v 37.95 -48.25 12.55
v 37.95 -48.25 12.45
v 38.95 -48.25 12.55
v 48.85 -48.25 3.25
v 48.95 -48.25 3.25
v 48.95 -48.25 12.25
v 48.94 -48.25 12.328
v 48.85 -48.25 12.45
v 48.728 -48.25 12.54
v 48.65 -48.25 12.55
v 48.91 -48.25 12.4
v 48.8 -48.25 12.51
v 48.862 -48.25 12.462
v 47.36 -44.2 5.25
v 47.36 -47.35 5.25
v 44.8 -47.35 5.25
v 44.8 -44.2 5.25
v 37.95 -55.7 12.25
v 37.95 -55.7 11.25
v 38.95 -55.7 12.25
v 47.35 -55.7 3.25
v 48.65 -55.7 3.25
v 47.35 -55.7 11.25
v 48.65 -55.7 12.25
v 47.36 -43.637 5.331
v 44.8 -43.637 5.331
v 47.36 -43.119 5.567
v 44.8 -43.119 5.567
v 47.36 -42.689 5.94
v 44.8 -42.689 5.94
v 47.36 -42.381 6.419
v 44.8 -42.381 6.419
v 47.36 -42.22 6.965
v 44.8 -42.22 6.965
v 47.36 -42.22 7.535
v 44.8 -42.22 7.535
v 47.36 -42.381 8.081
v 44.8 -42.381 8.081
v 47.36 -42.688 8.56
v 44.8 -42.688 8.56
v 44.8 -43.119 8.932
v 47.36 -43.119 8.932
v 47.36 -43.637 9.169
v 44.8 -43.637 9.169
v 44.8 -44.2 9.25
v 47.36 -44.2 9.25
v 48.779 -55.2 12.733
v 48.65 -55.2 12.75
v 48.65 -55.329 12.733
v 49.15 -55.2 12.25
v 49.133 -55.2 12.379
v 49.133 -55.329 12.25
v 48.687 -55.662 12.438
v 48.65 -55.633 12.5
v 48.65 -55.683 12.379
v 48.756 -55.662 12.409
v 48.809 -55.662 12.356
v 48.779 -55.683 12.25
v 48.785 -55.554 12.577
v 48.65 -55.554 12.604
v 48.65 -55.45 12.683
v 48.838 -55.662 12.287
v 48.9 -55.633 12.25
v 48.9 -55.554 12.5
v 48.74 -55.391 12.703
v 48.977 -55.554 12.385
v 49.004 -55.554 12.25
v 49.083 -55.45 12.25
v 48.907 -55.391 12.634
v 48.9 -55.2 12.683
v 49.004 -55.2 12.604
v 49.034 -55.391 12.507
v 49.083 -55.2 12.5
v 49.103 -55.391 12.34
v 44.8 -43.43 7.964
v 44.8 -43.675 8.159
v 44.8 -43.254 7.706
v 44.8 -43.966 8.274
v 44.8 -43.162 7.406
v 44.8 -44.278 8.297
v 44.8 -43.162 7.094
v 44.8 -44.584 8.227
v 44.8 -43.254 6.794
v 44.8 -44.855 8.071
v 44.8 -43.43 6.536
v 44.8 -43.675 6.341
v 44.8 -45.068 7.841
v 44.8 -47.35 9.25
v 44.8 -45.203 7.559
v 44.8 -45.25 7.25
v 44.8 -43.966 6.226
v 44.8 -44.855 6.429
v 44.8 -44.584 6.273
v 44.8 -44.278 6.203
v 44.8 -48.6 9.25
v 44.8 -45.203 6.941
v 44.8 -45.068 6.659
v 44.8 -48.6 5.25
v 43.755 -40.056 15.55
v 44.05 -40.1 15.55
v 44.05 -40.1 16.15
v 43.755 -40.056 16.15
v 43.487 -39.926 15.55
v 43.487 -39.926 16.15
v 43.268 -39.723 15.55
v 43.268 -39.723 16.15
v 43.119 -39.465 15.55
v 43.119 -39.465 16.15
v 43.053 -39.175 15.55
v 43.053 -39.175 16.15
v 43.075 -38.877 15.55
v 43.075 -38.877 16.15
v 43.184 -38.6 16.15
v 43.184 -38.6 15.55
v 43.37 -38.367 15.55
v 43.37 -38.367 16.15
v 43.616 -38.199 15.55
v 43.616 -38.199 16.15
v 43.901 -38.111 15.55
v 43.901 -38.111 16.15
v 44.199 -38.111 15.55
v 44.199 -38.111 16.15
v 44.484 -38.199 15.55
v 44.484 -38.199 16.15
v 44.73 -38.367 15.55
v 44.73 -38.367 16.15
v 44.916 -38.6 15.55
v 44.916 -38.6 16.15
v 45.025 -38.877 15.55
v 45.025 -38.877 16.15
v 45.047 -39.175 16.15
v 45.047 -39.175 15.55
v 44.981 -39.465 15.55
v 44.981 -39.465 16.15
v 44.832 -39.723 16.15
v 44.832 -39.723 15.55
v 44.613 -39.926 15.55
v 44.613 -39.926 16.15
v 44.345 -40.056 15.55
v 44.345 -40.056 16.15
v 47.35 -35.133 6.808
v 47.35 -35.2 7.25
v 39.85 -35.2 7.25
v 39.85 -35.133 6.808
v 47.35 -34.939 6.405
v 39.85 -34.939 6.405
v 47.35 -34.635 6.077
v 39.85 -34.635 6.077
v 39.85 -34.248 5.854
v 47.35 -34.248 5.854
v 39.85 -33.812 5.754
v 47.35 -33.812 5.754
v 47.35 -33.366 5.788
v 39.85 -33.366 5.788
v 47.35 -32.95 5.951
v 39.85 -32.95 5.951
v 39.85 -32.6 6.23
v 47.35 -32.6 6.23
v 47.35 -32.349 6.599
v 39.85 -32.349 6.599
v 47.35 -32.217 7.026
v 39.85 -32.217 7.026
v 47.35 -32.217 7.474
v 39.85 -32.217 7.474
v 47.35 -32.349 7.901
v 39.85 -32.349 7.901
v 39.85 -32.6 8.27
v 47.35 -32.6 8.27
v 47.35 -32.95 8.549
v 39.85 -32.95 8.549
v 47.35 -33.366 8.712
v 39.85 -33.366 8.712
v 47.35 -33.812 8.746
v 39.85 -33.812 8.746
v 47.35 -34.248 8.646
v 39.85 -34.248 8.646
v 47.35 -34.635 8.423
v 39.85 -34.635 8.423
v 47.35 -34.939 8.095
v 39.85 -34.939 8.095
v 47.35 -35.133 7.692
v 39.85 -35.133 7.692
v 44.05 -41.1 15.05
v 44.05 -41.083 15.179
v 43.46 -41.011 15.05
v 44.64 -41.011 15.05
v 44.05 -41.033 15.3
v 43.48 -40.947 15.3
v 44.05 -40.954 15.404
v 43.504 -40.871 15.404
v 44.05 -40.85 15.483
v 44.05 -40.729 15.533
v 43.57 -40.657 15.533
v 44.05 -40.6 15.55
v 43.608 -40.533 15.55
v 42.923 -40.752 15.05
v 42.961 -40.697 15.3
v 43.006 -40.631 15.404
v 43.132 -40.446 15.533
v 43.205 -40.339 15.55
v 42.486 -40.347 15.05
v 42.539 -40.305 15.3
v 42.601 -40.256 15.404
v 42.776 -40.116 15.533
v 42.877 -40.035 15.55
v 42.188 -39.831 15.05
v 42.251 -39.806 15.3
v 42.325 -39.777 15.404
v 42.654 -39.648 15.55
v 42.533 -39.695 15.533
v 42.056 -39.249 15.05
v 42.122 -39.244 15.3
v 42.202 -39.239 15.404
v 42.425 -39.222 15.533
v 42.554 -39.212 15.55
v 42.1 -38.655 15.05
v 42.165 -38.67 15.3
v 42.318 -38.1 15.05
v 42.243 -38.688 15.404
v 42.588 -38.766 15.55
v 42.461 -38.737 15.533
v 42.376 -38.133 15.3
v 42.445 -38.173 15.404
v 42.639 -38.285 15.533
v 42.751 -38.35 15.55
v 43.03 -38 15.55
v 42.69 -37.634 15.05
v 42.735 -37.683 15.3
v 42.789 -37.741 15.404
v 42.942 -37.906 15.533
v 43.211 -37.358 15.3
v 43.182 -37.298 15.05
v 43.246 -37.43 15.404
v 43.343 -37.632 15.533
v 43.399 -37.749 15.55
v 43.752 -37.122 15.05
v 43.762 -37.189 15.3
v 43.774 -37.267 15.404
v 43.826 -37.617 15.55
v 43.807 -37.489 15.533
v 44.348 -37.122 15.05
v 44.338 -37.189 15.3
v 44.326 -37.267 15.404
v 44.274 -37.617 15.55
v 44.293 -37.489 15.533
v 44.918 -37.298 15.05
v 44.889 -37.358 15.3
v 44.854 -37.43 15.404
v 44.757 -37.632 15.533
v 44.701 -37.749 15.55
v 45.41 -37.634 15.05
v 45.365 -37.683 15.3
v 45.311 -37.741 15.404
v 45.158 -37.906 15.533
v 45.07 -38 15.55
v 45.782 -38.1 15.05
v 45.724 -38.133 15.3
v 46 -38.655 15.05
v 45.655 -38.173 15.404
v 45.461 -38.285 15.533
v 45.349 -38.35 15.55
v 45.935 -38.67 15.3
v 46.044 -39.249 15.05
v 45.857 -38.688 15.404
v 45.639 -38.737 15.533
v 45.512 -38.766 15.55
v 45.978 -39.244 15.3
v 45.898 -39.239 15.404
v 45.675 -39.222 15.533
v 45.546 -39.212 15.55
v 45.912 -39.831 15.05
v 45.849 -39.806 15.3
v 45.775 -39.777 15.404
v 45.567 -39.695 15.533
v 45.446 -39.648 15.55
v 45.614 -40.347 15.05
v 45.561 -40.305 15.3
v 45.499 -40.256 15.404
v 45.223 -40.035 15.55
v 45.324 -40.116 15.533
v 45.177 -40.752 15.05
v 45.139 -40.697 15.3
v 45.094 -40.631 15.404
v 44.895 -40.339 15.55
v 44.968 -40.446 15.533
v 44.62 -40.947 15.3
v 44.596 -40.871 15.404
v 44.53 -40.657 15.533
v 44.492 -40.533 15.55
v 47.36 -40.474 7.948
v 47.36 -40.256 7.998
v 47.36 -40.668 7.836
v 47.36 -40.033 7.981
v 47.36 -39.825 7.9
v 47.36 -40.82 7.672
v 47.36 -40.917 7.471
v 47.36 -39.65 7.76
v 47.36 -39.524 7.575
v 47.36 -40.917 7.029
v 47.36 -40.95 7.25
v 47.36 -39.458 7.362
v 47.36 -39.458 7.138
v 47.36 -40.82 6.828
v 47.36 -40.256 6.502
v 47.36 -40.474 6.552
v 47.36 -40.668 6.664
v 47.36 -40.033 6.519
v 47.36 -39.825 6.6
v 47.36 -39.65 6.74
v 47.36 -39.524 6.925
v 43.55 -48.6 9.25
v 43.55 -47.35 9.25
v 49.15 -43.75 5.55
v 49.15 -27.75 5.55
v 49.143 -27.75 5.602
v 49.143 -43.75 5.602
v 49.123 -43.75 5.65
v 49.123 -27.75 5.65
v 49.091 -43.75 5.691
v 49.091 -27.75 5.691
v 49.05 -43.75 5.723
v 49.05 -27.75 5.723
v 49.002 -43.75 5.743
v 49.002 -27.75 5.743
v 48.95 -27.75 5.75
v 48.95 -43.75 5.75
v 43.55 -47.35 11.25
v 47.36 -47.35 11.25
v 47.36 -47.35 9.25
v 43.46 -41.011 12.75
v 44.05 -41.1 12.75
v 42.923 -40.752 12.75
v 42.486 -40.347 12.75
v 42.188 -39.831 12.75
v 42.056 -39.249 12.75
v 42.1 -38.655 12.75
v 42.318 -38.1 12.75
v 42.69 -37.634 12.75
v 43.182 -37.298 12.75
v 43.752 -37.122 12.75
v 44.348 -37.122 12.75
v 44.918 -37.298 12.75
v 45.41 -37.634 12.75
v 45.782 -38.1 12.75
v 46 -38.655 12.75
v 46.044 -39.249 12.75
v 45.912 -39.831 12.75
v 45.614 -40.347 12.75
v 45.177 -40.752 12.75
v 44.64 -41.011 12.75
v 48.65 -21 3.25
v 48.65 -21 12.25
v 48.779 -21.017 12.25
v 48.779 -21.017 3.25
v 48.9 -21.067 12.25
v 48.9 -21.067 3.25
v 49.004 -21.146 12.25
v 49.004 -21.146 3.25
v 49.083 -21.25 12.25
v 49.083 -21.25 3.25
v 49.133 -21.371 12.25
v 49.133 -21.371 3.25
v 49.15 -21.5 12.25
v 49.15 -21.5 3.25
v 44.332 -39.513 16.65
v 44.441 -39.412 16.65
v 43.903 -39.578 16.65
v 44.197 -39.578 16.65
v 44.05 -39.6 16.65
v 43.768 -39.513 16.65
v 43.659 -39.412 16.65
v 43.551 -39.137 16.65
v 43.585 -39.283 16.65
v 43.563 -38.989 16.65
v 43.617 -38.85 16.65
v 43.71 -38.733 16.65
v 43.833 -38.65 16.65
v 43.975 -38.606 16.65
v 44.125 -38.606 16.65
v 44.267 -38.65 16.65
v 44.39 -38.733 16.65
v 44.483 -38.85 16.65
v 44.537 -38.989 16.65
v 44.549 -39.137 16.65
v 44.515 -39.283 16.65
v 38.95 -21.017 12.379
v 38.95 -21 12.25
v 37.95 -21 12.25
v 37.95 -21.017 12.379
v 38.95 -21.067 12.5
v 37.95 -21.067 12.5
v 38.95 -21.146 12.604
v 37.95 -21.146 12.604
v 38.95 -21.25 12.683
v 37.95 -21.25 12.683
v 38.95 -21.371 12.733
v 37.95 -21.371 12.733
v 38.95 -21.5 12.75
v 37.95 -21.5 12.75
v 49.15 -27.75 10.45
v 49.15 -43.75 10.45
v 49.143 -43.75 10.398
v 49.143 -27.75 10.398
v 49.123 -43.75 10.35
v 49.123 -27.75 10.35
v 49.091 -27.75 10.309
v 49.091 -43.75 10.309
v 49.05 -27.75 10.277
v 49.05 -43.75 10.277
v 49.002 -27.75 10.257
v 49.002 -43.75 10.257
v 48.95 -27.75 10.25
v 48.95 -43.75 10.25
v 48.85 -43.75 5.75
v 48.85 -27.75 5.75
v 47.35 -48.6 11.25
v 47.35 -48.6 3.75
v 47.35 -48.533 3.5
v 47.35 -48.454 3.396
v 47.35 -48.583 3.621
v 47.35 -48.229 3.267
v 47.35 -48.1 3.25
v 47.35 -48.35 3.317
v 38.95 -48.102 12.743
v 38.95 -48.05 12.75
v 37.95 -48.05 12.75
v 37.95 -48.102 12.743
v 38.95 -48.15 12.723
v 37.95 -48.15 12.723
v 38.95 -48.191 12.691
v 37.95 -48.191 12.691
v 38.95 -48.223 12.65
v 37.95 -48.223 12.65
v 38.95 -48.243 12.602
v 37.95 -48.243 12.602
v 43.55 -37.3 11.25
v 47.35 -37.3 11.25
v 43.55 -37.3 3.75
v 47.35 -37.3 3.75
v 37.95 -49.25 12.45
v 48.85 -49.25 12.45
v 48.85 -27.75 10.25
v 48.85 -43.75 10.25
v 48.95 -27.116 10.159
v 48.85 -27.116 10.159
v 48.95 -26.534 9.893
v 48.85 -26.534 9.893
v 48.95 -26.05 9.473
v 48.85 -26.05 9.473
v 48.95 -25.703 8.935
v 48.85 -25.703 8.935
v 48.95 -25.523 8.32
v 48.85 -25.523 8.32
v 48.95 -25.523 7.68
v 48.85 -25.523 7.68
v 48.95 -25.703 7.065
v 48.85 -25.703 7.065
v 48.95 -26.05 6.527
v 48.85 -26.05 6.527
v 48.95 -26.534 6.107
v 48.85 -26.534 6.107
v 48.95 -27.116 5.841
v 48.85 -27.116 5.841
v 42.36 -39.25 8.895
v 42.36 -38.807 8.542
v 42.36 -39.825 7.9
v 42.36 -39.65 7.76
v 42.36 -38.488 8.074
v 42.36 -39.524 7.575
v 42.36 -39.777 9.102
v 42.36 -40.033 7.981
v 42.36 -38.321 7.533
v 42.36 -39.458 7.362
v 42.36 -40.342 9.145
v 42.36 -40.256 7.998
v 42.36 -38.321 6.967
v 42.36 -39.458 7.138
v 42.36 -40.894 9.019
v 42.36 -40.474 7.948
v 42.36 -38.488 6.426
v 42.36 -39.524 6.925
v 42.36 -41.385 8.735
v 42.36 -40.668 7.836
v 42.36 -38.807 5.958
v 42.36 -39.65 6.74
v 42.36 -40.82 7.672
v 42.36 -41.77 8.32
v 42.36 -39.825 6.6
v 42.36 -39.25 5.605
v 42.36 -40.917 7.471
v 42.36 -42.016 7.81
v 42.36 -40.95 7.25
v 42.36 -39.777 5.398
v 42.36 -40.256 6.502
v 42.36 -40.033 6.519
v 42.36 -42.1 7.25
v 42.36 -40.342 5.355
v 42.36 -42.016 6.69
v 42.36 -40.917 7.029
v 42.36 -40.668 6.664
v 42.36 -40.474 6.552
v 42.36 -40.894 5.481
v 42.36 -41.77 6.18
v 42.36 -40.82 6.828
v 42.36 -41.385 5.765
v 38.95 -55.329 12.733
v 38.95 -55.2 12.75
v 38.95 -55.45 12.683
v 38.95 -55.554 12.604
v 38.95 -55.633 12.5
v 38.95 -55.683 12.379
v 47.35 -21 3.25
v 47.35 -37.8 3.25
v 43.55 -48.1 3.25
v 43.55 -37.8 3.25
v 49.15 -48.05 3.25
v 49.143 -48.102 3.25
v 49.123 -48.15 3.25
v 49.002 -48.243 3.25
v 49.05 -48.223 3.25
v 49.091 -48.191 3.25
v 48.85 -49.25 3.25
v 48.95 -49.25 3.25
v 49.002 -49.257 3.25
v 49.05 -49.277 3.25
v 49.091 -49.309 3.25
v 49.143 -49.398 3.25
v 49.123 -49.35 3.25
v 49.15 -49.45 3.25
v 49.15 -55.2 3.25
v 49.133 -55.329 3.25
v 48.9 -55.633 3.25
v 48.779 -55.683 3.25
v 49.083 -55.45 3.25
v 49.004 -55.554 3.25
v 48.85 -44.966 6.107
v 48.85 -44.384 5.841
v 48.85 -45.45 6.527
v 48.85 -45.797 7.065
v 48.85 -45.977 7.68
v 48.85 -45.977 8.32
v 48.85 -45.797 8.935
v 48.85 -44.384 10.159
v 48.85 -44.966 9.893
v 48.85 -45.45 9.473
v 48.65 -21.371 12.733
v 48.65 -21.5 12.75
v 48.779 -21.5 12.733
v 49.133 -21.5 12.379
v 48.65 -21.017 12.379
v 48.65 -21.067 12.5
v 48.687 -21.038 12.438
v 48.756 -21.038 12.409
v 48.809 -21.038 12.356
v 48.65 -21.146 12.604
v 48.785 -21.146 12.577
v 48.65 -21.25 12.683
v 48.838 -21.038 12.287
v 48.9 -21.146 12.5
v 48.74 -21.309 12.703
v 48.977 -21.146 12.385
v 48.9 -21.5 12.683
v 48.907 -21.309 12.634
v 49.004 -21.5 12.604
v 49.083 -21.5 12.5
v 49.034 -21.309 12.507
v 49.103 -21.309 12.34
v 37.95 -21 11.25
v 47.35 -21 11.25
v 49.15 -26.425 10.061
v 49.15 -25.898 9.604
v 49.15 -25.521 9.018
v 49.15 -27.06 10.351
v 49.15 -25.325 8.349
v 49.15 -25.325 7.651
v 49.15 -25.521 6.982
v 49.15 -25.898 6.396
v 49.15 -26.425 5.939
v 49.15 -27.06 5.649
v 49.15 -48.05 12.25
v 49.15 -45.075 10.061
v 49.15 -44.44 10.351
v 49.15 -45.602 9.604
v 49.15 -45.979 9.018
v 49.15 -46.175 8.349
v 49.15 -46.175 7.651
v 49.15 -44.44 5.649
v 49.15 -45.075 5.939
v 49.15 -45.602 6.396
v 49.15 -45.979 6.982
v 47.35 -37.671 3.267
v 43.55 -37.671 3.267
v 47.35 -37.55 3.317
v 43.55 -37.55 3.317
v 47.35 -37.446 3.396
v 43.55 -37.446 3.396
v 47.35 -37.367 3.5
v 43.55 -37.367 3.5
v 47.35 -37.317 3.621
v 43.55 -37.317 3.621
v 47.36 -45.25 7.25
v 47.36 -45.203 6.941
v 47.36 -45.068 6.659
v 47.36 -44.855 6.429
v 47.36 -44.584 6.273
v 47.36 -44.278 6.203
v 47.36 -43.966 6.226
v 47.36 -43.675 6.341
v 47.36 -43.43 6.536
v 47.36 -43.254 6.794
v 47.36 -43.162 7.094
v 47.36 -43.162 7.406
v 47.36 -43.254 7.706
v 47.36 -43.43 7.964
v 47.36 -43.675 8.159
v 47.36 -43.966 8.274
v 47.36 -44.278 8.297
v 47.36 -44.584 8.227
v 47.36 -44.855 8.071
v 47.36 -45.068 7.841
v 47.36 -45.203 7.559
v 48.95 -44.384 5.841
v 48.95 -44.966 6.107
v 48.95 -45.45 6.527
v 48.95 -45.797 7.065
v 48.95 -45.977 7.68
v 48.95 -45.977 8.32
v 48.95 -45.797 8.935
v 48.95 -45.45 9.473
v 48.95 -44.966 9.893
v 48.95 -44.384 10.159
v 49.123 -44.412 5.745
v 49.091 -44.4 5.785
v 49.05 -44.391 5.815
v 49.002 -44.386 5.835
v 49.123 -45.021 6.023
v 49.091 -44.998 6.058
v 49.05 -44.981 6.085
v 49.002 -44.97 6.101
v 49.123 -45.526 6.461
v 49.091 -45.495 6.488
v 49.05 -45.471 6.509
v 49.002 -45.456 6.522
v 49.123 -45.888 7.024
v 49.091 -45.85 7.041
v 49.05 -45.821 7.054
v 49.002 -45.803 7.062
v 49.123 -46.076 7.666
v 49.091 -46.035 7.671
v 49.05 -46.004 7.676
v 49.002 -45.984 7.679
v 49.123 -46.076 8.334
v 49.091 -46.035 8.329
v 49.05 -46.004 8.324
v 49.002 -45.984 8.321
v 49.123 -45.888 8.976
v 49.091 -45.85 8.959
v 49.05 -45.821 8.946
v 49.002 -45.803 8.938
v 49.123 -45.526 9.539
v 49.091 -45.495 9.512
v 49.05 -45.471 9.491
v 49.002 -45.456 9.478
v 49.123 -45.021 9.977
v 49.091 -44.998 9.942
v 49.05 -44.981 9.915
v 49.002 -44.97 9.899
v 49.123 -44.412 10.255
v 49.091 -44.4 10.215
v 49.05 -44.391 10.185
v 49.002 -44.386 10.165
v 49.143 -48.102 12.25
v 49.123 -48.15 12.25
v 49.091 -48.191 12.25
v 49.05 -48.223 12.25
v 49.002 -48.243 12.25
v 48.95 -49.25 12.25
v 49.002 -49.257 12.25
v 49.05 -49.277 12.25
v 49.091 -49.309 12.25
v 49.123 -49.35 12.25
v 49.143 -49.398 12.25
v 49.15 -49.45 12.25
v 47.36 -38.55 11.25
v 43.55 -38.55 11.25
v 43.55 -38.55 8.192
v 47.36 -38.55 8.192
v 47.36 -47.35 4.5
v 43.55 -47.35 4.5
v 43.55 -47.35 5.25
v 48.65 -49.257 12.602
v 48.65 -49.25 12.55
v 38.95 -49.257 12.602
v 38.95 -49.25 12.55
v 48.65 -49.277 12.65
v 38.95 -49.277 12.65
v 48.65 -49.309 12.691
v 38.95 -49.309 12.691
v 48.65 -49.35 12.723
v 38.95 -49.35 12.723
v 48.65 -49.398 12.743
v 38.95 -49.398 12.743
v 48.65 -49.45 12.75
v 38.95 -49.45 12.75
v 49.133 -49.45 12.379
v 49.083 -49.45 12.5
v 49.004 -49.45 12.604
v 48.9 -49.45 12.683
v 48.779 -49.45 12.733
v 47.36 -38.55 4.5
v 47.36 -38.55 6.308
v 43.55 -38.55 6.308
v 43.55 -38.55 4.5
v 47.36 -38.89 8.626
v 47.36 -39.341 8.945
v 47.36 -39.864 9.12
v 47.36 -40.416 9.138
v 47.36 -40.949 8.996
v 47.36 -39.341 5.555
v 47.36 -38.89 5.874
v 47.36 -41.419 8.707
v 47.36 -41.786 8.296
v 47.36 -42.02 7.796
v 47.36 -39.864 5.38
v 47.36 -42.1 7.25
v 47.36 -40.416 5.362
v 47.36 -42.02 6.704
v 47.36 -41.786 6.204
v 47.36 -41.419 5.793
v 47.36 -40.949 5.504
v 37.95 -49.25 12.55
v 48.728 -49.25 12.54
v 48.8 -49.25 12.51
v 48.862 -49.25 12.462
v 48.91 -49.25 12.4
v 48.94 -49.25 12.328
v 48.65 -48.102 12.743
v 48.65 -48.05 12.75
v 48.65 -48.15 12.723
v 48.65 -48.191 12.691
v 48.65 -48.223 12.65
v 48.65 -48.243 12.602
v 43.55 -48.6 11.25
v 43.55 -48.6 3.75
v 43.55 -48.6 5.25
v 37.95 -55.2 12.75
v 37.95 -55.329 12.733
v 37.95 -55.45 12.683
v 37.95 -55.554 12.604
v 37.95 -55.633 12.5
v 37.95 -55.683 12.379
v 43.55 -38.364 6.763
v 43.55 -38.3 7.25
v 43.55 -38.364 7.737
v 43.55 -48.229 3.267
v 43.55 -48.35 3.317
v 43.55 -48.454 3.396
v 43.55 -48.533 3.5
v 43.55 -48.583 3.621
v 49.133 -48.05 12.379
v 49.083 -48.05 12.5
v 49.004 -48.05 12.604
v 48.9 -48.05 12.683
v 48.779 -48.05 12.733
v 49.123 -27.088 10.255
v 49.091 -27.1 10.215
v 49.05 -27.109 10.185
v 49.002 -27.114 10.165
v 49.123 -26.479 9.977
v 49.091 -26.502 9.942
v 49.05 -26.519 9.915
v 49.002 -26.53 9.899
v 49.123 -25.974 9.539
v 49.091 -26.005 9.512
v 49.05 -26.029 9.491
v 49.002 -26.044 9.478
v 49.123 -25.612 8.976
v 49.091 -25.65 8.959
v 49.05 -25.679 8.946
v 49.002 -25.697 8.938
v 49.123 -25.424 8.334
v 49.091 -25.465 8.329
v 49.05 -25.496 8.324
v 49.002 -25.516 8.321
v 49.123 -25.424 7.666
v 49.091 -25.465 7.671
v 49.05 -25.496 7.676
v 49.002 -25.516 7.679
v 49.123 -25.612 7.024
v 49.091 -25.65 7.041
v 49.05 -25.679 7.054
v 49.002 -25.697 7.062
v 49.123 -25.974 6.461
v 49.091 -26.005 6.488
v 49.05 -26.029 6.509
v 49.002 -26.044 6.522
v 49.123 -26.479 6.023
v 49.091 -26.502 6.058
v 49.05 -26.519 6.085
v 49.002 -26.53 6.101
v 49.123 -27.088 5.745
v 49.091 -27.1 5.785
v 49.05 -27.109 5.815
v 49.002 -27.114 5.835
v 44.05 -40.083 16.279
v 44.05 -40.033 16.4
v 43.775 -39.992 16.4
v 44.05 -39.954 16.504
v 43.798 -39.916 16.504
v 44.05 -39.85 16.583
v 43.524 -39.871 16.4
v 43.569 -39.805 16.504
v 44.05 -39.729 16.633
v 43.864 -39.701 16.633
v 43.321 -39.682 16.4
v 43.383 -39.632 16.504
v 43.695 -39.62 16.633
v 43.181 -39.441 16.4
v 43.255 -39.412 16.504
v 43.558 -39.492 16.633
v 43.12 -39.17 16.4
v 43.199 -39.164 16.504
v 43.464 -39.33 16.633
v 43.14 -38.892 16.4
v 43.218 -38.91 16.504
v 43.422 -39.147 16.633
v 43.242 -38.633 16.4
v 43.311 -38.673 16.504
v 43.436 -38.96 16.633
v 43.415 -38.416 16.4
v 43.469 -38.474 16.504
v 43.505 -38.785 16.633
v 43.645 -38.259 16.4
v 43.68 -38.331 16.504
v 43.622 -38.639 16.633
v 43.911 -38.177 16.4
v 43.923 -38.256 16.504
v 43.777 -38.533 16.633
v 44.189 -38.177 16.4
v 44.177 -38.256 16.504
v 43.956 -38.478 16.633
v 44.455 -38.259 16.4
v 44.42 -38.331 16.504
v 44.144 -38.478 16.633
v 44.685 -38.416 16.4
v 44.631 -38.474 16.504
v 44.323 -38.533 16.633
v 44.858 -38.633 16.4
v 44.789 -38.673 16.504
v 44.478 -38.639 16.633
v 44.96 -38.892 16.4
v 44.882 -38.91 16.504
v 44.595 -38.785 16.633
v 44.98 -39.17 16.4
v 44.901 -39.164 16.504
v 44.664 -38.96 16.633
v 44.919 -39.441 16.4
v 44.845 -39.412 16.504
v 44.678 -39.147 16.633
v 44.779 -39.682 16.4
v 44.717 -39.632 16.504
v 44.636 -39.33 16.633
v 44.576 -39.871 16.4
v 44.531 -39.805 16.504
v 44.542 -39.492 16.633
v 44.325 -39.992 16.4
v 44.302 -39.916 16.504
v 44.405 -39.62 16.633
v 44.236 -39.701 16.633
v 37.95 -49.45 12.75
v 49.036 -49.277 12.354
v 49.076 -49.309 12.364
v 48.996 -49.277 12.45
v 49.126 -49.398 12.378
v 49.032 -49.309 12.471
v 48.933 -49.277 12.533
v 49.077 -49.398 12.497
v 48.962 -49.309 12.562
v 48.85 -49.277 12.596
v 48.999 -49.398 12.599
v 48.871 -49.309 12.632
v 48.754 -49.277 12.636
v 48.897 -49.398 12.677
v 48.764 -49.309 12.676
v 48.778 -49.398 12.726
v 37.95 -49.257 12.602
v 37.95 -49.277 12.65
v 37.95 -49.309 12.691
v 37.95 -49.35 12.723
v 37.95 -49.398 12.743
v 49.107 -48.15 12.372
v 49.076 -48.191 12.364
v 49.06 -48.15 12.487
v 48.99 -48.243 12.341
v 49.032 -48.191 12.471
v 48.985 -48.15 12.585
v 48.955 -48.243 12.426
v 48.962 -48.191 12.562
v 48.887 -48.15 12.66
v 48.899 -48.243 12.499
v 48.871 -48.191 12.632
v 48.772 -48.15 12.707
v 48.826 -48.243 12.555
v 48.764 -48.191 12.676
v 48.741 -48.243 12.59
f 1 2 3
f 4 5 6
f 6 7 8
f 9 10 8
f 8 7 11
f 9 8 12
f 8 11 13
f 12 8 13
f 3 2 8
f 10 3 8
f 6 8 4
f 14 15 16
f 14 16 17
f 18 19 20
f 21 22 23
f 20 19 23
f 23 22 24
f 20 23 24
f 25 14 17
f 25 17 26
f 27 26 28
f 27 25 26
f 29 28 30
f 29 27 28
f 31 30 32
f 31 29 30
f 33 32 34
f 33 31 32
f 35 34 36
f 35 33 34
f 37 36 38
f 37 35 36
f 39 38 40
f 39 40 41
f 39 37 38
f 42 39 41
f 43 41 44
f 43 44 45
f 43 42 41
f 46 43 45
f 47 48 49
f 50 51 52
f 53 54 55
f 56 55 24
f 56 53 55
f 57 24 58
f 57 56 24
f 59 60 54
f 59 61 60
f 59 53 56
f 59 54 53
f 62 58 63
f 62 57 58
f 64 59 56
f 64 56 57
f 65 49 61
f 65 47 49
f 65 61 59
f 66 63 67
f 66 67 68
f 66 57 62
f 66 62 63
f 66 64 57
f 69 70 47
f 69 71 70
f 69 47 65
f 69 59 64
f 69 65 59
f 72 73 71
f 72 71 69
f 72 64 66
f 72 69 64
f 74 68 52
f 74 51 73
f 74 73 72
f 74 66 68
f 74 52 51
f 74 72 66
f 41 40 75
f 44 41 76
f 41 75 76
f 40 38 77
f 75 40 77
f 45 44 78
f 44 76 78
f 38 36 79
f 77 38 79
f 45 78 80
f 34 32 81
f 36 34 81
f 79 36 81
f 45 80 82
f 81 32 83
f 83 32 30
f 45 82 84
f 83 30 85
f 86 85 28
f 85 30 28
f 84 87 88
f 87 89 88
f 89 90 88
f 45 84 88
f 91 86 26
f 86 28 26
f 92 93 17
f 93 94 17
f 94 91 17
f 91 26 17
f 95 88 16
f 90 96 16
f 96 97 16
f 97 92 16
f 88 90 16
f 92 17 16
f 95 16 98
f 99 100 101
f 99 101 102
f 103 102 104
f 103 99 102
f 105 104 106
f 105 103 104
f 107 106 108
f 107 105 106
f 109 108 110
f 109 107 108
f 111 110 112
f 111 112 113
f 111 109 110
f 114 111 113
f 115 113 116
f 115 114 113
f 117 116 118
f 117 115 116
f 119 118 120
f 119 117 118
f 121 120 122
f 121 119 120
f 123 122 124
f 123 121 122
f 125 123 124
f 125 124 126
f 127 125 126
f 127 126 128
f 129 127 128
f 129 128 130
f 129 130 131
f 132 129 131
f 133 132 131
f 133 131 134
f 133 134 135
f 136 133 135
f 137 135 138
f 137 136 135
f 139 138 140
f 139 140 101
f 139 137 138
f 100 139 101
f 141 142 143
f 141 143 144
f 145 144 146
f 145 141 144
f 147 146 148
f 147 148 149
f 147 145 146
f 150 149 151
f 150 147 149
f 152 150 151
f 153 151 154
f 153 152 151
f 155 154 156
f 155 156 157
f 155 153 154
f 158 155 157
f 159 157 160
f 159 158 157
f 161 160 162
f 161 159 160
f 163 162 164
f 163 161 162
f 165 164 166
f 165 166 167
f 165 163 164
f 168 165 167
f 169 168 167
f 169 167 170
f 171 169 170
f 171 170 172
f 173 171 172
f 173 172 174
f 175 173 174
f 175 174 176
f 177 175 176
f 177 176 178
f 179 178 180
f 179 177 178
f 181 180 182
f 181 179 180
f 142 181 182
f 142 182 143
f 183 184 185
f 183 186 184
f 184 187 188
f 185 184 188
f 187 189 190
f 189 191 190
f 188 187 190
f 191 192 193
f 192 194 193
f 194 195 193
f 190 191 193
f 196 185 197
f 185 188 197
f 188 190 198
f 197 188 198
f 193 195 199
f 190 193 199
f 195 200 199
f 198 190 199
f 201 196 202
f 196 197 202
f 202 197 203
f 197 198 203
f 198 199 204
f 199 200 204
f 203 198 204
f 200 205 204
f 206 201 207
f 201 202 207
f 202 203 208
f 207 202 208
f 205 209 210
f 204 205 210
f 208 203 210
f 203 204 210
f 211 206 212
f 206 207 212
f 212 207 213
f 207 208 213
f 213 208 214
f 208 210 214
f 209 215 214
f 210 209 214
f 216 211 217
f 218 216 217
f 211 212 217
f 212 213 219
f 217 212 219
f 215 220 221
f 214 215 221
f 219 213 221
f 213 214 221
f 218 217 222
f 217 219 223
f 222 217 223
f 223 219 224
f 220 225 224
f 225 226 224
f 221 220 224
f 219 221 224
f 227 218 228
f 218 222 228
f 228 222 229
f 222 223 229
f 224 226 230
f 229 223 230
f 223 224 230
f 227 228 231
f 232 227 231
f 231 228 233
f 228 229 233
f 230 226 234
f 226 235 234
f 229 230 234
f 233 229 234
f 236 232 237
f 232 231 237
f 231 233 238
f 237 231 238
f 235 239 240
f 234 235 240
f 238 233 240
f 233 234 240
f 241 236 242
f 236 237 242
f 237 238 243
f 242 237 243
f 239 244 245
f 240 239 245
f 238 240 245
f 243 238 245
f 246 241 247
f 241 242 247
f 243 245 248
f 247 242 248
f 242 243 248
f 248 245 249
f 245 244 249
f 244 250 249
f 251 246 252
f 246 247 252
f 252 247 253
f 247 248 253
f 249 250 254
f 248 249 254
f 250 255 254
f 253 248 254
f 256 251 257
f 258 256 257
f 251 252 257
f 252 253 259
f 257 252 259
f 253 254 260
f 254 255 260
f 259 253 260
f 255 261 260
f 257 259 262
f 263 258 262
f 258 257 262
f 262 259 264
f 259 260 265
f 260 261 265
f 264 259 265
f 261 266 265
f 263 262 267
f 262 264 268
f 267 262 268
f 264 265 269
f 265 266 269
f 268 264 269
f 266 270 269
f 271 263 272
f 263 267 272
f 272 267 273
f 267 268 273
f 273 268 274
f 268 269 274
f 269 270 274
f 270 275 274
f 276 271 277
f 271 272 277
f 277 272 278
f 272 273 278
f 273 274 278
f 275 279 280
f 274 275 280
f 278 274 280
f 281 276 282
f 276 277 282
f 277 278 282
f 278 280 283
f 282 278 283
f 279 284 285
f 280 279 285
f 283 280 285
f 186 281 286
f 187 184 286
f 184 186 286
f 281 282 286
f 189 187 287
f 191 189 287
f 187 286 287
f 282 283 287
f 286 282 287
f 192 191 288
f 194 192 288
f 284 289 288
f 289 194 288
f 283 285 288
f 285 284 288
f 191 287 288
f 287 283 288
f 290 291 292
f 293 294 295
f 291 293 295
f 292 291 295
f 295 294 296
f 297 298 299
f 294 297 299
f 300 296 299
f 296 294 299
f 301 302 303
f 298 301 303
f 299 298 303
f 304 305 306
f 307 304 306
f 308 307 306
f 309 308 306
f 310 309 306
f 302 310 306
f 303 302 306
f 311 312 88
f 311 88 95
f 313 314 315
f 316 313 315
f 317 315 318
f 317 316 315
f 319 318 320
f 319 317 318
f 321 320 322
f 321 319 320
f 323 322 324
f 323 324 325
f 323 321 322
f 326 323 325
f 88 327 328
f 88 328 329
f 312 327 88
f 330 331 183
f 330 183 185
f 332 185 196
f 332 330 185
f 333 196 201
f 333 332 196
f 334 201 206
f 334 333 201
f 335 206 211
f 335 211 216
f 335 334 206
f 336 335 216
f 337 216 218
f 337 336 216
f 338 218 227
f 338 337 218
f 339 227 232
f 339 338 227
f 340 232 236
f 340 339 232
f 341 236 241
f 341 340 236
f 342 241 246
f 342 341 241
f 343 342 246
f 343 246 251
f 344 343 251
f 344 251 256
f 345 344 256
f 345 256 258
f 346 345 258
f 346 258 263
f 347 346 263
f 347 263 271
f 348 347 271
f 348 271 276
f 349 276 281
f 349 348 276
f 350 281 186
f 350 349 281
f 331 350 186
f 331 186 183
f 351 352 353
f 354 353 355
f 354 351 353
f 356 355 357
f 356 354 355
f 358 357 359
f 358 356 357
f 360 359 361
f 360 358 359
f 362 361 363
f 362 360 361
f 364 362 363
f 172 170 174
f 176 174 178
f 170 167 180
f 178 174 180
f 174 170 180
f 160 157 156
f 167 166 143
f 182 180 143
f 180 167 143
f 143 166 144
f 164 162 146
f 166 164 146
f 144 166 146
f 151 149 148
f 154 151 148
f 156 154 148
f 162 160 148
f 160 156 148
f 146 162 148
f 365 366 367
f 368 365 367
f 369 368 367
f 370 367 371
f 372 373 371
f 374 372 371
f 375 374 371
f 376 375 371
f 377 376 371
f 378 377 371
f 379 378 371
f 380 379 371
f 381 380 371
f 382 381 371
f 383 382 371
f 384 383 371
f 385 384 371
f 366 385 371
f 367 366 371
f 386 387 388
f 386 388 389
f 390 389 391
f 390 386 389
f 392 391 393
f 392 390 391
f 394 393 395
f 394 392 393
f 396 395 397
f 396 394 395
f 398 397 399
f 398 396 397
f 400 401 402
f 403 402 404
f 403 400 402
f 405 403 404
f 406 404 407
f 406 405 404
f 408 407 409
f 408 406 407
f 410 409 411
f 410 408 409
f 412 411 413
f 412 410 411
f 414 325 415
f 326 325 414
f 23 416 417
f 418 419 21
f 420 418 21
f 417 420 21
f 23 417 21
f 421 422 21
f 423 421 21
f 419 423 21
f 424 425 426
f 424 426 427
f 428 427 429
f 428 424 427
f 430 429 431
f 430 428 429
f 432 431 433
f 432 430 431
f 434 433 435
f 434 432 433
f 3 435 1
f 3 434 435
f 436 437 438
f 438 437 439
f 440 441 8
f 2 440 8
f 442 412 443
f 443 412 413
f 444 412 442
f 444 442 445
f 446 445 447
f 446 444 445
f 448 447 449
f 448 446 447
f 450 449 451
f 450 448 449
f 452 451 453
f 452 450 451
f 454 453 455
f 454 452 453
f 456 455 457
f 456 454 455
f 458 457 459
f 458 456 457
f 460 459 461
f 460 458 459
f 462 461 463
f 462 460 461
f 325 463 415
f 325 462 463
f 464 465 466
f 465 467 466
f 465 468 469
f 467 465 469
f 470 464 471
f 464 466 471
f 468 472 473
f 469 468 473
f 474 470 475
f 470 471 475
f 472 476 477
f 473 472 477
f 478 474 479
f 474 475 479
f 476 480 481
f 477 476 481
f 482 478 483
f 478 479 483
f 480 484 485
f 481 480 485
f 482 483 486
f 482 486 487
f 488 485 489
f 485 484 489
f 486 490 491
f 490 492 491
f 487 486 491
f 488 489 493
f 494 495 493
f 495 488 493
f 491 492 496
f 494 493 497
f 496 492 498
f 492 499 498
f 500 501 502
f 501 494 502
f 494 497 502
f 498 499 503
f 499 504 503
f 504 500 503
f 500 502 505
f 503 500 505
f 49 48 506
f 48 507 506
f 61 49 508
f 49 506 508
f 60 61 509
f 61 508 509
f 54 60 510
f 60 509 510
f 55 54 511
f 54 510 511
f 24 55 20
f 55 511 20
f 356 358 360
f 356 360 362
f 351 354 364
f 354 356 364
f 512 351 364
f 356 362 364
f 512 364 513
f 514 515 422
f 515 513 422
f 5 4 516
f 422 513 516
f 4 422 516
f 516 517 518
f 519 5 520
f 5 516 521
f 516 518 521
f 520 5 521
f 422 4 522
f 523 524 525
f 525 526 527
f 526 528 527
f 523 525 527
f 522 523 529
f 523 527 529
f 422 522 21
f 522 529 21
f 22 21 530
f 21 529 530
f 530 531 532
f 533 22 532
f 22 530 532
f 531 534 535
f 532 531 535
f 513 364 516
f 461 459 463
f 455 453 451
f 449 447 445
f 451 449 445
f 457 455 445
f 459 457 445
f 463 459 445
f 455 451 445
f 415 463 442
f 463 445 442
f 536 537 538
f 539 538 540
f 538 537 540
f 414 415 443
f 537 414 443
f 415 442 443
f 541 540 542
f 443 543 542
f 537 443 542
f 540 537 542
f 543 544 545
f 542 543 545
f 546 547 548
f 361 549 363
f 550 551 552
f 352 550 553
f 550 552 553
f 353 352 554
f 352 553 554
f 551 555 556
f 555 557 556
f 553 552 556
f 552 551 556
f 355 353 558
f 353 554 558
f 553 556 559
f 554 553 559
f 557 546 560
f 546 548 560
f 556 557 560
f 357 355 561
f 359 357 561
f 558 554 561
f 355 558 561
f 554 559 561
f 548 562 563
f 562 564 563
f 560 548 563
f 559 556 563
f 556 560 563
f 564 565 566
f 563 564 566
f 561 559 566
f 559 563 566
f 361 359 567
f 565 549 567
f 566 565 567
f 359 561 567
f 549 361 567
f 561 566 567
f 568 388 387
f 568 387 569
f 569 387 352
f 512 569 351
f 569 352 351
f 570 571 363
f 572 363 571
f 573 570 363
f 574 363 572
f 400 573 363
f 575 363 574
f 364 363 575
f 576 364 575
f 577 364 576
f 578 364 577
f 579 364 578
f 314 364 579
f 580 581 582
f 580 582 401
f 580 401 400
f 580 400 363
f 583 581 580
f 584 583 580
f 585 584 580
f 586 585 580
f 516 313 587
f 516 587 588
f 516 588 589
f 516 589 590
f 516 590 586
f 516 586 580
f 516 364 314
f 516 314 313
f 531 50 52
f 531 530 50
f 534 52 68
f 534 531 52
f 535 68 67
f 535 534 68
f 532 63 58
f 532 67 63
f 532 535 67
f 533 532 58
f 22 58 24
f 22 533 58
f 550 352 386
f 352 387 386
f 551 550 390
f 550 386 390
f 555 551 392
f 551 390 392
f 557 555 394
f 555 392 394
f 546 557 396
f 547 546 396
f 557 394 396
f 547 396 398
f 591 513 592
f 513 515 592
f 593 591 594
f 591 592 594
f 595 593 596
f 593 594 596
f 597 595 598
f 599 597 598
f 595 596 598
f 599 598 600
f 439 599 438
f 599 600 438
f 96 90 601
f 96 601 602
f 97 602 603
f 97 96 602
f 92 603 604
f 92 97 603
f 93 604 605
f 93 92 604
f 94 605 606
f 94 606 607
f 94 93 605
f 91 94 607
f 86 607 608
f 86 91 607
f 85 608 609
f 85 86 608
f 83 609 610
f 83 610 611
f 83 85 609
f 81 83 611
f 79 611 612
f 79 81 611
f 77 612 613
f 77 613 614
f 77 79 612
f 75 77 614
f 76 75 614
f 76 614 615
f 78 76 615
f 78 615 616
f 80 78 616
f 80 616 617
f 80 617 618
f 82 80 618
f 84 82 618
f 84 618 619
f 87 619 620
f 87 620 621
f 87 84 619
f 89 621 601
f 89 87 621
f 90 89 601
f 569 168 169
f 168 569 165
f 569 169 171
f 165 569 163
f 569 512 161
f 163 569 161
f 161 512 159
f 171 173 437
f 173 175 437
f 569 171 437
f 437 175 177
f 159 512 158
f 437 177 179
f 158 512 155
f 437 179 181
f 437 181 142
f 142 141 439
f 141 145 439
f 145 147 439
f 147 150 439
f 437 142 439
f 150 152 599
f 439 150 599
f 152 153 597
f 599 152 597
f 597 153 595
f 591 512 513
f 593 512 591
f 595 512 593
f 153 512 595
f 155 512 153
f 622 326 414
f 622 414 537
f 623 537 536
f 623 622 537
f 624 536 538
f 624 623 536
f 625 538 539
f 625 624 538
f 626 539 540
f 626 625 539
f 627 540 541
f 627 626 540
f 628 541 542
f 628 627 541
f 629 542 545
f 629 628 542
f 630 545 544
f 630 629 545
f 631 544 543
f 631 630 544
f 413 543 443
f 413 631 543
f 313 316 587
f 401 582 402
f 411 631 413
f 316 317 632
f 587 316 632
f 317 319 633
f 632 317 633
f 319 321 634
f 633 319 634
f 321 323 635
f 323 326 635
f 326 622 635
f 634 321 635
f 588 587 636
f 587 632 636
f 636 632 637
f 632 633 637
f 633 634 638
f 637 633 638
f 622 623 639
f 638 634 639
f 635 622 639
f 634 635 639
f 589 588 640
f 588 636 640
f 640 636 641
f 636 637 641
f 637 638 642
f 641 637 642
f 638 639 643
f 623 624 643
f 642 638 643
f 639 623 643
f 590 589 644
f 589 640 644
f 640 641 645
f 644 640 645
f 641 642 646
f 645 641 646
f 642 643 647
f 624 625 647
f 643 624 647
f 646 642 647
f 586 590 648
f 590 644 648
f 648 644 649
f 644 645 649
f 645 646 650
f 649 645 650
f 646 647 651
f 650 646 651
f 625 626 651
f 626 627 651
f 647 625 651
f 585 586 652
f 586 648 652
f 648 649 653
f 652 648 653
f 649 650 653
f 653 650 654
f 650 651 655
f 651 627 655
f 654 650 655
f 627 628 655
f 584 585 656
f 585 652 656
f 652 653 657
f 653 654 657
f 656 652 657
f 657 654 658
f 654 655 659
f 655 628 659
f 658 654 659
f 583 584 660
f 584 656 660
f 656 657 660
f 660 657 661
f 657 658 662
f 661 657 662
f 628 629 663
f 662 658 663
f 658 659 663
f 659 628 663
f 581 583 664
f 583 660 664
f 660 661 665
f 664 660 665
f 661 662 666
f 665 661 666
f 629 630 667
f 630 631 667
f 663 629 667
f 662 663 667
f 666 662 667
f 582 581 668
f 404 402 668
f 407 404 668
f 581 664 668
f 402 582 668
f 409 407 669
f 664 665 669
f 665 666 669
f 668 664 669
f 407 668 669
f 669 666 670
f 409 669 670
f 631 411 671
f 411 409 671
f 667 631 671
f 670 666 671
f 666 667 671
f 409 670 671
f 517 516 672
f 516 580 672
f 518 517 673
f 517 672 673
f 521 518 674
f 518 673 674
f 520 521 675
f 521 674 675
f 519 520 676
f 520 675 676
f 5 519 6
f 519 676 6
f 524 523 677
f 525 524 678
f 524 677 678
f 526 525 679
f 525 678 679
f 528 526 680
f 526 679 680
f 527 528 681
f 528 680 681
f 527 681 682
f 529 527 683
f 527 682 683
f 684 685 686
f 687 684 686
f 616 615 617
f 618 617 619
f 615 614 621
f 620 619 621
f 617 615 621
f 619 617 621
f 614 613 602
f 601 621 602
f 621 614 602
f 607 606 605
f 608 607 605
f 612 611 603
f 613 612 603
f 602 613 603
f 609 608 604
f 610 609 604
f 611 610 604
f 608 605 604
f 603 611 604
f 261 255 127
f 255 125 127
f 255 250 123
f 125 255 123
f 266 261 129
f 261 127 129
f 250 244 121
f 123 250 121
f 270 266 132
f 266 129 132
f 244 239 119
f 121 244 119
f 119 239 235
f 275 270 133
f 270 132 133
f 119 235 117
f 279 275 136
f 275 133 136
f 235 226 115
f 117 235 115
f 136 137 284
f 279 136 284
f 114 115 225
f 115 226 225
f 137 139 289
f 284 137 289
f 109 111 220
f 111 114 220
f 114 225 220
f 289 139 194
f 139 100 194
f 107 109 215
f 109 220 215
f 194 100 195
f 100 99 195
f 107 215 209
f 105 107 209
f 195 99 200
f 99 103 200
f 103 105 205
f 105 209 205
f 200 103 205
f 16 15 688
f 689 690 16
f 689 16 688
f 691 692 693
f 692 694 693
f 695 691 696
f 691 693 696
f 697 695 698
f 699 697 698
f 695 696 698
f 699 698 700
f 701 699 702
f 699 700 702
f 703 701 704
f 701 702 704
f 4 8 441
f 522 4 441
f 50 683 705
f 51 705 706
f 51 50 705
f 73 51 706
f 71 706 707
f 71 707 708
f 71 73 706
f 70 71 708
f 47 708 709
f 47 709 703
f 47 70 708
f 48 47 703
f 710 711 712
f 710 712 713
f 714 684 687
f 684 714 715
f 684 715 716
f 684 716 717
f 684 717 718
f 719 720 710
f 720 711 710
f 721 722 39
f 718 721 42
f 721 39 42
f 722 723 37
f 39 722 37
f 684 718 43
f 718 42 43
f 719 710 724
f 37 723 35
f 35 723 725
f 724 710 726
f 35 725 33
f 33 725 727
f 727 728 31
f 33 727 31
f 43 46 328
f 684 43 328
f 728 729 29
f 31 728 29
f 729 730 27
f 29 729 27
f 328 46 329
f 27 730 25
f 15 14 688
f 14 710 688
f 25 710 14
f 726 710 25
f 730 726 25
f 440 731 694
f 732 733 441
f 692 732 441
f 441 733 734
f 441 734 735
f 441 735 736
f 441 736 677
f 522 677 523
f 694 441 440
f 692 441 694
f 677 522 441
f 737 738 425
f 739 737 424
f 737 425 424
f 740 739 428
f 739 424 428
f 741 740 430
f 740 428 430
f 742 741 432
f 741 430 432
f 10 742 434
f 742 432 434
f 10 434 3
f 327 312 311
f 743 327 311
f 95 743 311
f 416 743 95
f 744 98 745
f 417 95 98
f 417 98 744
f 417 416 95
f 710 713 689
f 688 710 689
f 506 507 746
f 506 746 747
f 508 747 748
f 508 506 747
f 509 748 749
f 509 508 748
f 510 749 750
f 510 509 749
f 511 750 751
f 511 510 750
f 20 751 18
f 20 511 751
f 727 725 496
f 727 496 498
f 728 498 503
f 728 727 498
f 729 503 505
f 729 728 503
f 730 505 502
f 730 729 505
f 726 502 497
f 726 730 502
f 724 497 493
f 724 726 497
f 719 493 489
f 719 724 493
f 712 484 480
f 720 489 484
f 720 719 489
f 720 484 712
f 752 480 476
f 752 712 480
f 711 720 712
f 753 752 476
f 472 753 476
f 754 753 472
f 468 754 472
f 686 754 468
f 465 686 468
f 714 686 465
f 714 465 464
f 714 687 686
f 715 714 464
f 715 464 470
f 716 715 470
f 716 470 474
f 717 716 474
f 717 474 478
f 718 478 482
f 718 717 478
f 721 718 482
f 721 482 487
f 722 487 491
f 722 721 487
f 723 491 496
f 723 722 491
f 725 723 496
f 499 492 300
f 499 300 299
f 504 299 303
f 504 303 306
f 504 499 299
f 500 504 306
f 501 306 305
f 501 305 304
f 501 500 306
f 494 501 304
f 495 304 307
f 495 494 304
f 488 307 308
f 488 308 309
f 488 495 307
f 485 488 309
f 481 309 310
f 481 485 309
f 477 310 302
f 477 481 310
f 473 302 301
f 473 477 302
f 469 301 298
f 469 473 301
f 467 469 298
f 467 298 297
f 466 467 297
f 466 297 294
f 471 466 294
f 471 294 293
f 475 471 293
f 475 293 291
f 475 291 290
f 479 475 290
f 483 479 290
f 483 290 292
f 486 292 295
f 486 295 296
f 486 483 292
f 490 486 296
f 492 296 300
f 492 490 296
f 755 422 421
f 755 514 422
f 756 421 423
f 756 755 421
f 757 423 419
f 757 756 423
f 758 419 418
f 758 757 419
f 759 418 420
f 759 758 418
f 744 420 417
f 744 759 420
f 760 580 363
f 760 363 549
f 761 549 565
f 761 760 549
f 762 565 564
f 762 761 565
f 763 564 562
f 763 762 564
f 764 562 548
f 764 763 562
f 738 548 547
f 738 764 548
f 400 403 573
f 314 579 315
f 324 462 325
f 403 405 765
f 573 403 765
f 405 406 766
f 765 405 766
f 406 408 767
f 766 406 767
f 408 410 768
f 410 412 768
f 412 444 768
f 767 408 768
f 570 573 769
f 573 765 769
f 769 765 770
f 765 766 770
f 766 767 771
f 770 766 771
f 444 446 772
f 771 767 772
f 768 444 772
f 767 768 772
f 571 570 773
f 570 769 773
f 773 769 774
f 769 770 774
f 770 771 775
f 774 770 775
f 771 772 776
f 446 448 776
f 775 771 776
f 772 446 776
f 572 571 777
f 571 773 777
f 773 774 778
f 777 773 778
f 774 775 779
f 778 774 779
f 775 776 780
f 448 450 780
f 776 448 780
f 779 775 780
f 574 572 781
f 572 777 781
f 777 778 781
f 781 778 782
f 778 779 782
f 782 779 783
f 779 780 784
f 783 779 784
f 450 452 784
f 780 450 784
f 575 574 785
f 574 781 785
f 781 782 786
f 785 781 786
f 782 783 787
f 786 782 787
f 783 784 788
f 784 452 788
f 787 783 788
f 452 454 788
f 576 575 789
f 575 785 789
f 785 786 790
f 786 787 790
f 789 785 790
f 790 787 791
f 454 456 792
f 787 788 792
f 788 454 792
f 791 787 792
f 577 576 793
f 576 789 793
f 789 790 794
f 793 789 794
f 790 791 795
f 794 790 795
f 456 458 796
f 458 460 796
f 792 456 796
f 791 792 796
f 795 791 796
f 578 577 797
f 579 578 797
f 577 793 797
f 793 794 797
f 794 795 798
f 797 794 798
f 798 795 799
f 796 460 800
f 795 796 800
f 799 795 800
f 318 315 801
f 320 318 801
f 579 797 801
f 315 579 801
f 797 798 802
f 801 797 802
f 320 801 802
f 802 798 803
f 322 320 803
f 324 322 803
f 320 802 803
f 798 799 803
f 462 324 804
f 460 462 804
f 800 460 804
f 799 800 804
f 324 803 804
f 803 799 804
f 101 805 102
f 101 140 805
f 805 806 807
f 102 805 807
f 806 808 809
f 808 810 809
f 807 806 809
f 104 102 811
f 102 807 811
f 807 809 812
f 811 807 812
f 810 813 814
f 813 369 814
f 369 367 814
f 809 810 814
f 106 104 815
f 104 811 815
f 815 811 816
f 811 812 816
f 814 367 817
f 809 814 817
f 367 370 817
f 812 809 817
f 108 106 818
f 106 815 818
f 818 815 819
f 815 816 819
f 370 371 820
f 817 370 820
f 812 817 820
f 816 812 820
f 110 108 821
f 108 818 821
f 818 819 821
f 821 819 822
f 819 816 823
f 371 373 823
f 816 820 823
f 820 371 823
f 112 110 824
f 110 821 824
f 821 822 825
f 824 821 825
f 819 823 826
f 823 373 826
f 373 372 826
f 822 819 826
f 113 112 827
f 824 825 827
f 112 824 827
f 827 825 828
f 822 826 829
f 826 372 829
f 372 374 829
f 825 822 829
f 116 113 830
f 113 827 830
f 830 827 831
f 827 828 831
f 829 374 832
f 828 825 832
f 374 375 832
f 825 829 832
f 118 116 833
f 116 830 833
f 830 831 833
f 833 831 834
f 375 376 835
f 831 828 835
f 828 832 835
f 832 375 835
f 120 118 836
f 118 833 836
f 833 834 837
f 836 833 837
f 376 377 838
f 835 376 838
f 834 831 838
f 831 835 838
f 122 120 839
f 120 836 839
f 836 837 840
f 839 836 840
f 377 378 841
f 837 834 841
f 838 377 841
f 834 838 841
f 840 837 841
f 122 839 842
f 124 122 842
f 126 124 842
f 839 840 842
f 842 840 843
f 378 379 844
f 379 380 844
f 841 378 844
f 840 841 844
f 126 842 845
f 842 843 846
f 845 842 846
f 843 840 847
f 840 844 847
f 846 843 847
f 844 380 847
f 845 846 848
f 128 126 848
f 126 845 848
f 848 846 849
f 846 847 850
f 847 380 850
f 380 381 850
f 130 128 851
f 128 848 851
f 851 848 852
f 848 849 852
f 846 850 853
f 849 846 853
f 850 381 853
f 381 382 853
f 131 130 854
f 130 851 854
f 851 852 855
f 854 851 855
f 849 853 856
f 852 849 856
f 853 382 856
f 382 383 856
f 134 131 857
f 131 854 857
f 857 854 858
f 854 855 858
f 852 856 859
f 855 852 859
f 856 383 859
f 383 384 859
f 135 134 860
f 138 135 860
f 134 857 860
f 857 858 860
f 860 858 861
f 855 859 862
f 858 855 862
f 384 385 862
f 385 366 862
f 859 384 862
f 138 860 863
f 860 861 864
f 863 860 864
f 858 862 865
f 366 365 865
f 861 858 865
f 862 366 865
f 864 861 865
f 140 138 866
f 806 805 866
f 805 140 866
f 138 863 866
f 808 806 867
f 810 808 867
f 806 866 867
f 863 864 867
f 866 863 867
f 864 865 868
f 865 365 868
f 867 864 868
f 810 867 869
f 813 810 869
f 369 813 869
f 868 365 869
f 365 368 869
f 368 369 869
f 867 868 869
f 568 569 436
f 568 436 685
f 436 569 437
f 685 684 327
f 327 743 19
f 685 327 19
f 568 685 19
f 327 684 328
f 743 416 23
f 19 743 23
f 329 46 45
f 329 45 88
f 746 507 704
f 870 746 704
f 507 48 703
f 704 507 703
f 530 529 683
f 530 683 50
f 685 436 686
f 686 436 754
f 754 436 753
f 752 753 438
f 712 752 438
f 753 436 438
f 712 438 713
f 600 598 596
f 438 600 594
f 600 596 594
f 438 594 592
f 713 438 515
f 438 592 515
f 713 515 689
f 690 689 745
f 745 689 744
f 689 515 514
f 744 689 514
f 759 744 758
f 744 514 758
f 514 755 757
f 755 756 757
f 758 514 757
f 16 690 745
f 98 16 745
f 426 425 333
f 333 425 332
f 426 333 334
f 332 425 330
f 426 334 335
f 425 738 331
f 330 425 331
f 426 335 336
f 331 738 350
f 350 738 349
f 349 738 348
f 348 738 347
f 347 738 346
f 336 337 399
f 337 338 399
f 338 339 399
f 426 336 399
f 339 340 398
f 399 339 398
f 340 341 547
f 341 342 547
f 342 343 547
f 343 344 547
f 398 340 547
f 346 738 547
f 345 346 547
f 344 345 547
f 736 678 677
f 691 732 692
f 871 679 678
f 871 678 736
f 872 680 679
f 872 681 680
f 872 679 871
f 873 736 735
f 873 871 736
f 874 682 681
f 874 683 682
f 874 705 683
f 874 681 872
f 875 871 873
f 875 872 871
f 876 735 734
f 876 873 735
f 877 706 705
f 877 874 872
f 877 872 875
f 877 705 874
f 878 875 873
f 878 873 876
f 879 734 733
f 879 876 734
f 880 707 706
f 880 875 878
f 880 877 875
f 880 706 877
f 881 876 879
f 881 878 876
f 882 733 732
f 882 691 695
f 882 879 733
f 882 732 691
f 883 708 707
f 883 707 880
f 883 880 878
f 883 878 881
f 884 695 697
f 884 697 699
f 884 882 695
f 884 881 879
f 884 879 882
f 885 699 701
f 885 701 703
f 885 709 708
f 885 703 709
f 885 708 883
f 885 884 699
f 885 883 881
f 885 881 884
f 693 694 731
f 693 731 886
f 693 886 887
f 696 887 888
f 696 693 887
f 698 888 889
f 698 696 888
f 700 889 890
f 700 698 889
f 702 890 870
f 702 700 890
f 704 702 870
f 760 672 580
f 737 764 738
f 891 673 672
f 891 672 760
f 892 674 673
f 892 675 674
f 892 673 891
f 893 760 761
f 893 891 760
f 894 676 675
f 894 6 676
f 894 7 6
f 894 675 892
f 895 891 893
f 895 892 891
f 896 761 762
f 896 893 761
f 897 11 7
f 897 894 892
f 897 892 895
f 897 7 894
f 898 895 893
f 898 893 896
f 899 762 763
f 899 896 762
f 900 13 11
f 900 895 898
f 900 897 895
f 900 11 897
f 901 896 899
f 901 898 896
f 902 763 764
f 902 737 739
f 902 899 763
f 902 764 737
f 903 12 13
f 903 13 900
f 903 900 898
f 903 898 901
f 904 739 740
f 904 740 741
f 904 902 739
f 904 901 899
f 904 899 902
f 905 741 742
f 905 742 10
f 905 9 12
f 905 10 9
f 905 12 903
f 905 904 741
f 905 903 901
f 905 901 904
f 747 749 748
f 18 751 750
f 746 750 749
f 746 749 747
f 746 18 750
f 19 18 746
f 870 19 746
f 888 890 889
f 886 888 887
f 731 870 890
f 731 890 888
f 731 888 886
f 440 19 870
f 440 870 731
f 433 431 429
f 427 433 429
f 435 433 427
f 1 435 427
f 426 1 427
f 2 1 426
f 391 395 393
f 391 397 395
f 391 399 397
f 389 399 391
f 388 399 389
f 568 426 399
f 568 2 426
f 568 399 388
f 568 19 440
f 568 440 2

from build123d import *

# Parameters (mm, degrees)
SKETCH164_W                    = 34.7
SKETCH164_H                    = 9.5
PAD087_DEPTH                   = 10.2
SKETCH165_W                    = 34.7
SKETCH165_H                    = 8
POCKET082_DEPTH                = 8.4
SKETCH166_W                    = 11.3
SKETCH166_H                    = 8
PAD088_DEPTH                   = 3.8
SKETCH167_R                    = 1.5
PAD089_DEPTH                   = 7.5
FILLET035_R                    = 0.5
SKETCH168_W                    = 8.8
SKETCH168_H                    = 6.75
POCKET083_DEPTH                = 3.81
SKETCH170_W                    = 1.25
SKETCH170_H                    = 4
POCKET084_DEPTH                = 1.25
PAD090_DEPTH                   = 2.56
SKETCH171_R                    = 1.9
PAD091_DEPTH                   = 5
SKETCH172_R                    = 1.05
POCKET085_DEPTH                = 2.56
SKETCH173_R                    = 0.75
POCKET086_DEPTH                = 5
SKETCH174_W                    = 1
SKETCH174_H                    = 9.5
POCKET087_DEPTH                = 0.3
SKETCH175_W                    = 1
SKETCH175_H                    = 10.2
POCKET088_DEPTH                = 0.3
FILLET036_R                    = 0.2
FILLET037_R                    = 0.2
SKETCH176_R                    = 2
PAD092_DEPTH                   = 2.8
FILLET038_R                    = 0.5
FILLET039_R                    = 0.5
SKETCH178_R                    = 1
PAD093_DEPTH                   = 1.1
FILLET040_R                    = 0.5
PAD162_DEPTH                   = 1
PART_MIRRORING_ROLL_ANGLE      = -90
PART_MIRRORING_PLACEMENT_ANGLE = -90


with BuildPart() as l_arm_shield:
    # Sketch164 → Pad087 (new body)
    with BuildSketch(Plane.XY):
        with Locations((-17.35, 0)):
            Rectangle(SKETCH164_W, SKETCH164_H)
    extrude(amount=PAD087_DEPTH)

    # Sketch165 (on Face6 of Pad087) → Pocket082 (cut)
    with BuildSketch(Plane.XY.offset(10.2)):
        with Locations((-17.35, 0.75)):
            Rectangle(SKETCH165_W, SKETCH165_H)
    extrude(amount=-POCKET082_DEPTH, mode=Mode.SUBTRACT)

    # Sketch166 (on Face6 of Pocket082) → Pad088 (join)
    with BuildSketch(Plane.XY.offset(1.8)):
        with Locations((-12.75, 0.75)):
            Rectangle(SKETCH166_W, SKETCH166_H)
    extrude(amount=PAD088_DEPTH)

    # Sketch167 (on Face6 of Pad088) → Pad089 (join)
    with BuildSketch(Plane.XY.offset(1.8)):
        with Locations((-22, 0.75)):
            Circle(SKETCH167_R)
    extrude(amount=PAD089_DEPTH)

    # Fillet035
    fillet035_edges = [l_arm_shield.edges().sort_by_distance(p)[0] for p in [
        (-17.35, -4.75, 0),
        (-34.7, -4.75, 5.1),
        (-34.7, 0, 0),
        (0, -4.75, 5.1),
        (0, 0, 0),
    ]]
    fillet(fillet035_edges, radius=FILLET035_R)

    # Sketch168 (on Face14 of Fillet035) → Pocket083 (cut)
    with BuildSketch(Plane.XY.offset(5.6)):
        with Locations((-12.75, 0.125)):
            Rectangle(SKETCH168_W, SKETCH168_H)
    extrude(amount=-POCKET083_DEPTH, mode=Mode.SUBTRACT)

    # Sketch170 (on Face13 of Pocket083) → Pocket084 (cut)
    with BuildSketch(Plane.XY.offset(5.6)):
        with Locations((-7.725, 0.75)):
            Rectangle(SKETCH170_W, SKETCH170_H)
    extrude(amount=-POCKET084_DEPTH, mode=Mode.SUBTRACT)

    # Sketch169 (on Face23 of Pocket083) → Pad090 (join)
    with BuildSketch(Plane.XY.offset(1.79)):
        with BuildLine():
            Line((-8.35, 2.75), (-11.5, 2.75))
            ThreePointArc((-11.5, 2.75), (-13.500002, 0.750015), (-11.500029, -1.25))
            Line((-11.500029, -1.25), (-8.35, -1.25))
            Line((-8.35, -1.25), (-8.35, 2.75))
        make_face()
    extrude(amount=PAD090_DEPTH)

    # Sketch171 (on Face16 of Pad090) → Pad091 (join)
    with BuildSketch(Plane.XY.offset(1.79)):
        with Locations((-15.5, 0.75)):
            Circle(SKETCH171_R)
    extrude(amount=PAD091_DEPTH)

    # Sketch172 (on Face26 of Pad091) → Pocket085 (cut)
    with BuildSketch(Plane.XY.offset(4.35)):
        with Locations((-11.5, 0.75)):
            Circle(SKETCH172_R)
    extrude(amount=-POCKET085_DEPTH, mode=Mode.SUBTRACT)

    # Sketch173 (on Face37 of Pocket085) → Pocket086 (cut)
    with BuildSketch(Plane.XY.offset(6.79)):
        with Locations((-15.5, 0.75)):
            Circle(SKETCH173_R)
    extrude(amount=-POCKET086_DEPTH, mode=Mode.SUBTRACT)

    # Sketch174 (on Face20 of Pocket086) → Pocket087 (cut)
    with BuildSketch(Plane(origin=(0, 0, 0), x_dir=(1, 0, 0), z_dir=(0, 0, -1))):
        with BuildLine():
            ThreePointArc((-27.95, 2.25), (-30.2, 0), (-27.95, -2.25))
            Line((-27.95, -2.25), (-11.95, -2.25))
            ThreePointArc((-11.95, -2.25), (-9.7, 0), (-11.95, 2.25))
            Line((-27.95, 2.25), (-11.95, 2.25))
        make_face()
        with Locations((-6.95, 0)):
            Rectangle(SKETCH174_W, SKETCH174_H)
    extrude(amount=-POCKET087_DEPTH, mode=Mode.SUBTRACT)

    # Sketch175 (on Face10 of Pocket087) → Pocket088 (cut)
    with BuildSketch(Plane.XZ.offset(4.75)):
        with Locations((-6.95, 5.1)):
            Rectangle(SKETCH175_W, SKETCH175_H)
    extrude(amount=-POCKET088_DEPTH, mode=Mode.SUBTRACT)

    # Fillet036
    fillet036_edges = [l_arm_shield.edges().sort_by_distance(p)[0] for p in [
        (-9.7, 0, 0),
        (-19.95, 2.25, 0),
        (-19.95, -2.25, 0),
        (-30.2, 0, 0),
    ]]
    fillet(fillet036_edges, radius=FILLET036_R)

    # Fillet037
    fillet037_edges = [l_arm_shield.edges().sort_by_distance(p)[0] for p in [
        (-7.45, 0.25, 0),
        (-6.45, 0.25, 0),
        (-7.45, -4.352155, 0.010547),
        (-7.45, -4.603553, 0.146447),
        (-7.45, -4.739453, 0.397845),
        (-7.45, -4.75, 5.35),
        (-6.45, -4.75, 5.35),
        (-6.45, -4.739453, 0.397845),
        (-6.45, -4.603553, 0.146447),
        (-6.45, -4.352155, 0.010547),
    ]]
    fillet(fillet037_edges, radius=FILLET037_R)

    # Sketch176 (on Face13 of Fillet037) → Pad092 (join)
    with BuildSketch(Plane.XZ.offset(4.75)):
        with Locations((-16.6, 5.1)):
            Circle(SKETCH176_R)
    extrude(amount=PAD092_DEPTH)

    # Fillet038
    fillet038_edges = [l_arm_shield.edges().sort_by_distance(p)[0] for p in [
        (-18.6, -7.55, 5.1),
    ]]
    fillet(fillet038_edges, radius=FILLET038_R)

    # Fillet039
    fillet039_edges = [l_arm_shield.edges().sort_by_distance(p)[0] for p in [
        (-7.1, 4.75, 3.7),
        (-18.4, 4.75, 3.7),
    ]]
    fillet(fillet039_edges, radius=FILLET039_R)

    # Sketch178 (on Face71 of Fillet039) → Pad093 (join)
    with BuildSketch(Plane.XZ.offset(7.55)):
        with Locations((-16.6, 5.1)):
            Circle(SKETCH178_R)
    extrude(amount=PAD093_DEPTH)

    # Fillet040
    fillet040_edges = [l_arm_shield.edges().sort_by_distance(p)[0] for p in [
        (-17.6, -8.65, 5.1),
    ]]
    fillet(fillet040_edges, radius=FILLET040_R)

    # Sketch283 (on Face11 of Fillet040) → Pad162 (join)
    with BuildSketch(Plane.XY.offset(10.2)):
        with BuildLine():
            Line((0, -3.25), (0, -4.25))
            ThreePointArc((-0.5, -4.75), (-0.146447, -4.603553), (0, -4.25))
            Line((-0.5, -4.75), (-6.25, -4.75))
            ThreePointArc((-6.45, -4.55), (-6.391421, -4.691421), (-6.25, -4.75))
            Line((-6.45, -4.55), (-6.45, -4.45))
            Line((-6.45, -4.45), (-7.45, -4.45))
            Line((-7.45, -4.45), (-7.45, -4.55))
            ThreePointArc((-7.65, -4.75), (-7.508579, -4.691421), (-7.45, -4.55))
            Line((-7.65, -4.75), (-34.2, -4.75))
            ThreePointArc((-34.7, -4.25), (-34.553553, -4.603553), (-34.2, -4.75))
            Line((-34.7, -4.25), (-34.7, -3.25))
            Line((-34.7, -3.25), (0, -3.25))
        make_face()
    extrude(amount=PAD162_DEPTH)


with BuildPart() as left_arm_shileld:
    # Part__Mirroring: instance of L_Arm_Shield
    add(l_arm_shield.part.mirror(Plane(origin=(0, 0, 0), x_dir=(0, 1, 0), z_dir=(0, 0, 1))))


with BuildPart() as left_arm_shileld_1:
    # Part__Mirroring roll: moved
    add(left_arm_shileld.part.rotate(Axis((0, 0, 0), (1, 0, 0)), PART_MIRRORING_ROLL_ANGLE))


with BuildPart() as left_arm_shileld_2:
    # Part__Mirroring placement: moved
    add(left_arm_shileld_1.part.moved(Location((49.15, -55.7, 8))).rotate(Axis((49.15, -55.7, 8), (0, 0, 1)), PART_MIRRORING_PLACEMENT_ANGLE))


solid = left_arm_shileld_2.part
